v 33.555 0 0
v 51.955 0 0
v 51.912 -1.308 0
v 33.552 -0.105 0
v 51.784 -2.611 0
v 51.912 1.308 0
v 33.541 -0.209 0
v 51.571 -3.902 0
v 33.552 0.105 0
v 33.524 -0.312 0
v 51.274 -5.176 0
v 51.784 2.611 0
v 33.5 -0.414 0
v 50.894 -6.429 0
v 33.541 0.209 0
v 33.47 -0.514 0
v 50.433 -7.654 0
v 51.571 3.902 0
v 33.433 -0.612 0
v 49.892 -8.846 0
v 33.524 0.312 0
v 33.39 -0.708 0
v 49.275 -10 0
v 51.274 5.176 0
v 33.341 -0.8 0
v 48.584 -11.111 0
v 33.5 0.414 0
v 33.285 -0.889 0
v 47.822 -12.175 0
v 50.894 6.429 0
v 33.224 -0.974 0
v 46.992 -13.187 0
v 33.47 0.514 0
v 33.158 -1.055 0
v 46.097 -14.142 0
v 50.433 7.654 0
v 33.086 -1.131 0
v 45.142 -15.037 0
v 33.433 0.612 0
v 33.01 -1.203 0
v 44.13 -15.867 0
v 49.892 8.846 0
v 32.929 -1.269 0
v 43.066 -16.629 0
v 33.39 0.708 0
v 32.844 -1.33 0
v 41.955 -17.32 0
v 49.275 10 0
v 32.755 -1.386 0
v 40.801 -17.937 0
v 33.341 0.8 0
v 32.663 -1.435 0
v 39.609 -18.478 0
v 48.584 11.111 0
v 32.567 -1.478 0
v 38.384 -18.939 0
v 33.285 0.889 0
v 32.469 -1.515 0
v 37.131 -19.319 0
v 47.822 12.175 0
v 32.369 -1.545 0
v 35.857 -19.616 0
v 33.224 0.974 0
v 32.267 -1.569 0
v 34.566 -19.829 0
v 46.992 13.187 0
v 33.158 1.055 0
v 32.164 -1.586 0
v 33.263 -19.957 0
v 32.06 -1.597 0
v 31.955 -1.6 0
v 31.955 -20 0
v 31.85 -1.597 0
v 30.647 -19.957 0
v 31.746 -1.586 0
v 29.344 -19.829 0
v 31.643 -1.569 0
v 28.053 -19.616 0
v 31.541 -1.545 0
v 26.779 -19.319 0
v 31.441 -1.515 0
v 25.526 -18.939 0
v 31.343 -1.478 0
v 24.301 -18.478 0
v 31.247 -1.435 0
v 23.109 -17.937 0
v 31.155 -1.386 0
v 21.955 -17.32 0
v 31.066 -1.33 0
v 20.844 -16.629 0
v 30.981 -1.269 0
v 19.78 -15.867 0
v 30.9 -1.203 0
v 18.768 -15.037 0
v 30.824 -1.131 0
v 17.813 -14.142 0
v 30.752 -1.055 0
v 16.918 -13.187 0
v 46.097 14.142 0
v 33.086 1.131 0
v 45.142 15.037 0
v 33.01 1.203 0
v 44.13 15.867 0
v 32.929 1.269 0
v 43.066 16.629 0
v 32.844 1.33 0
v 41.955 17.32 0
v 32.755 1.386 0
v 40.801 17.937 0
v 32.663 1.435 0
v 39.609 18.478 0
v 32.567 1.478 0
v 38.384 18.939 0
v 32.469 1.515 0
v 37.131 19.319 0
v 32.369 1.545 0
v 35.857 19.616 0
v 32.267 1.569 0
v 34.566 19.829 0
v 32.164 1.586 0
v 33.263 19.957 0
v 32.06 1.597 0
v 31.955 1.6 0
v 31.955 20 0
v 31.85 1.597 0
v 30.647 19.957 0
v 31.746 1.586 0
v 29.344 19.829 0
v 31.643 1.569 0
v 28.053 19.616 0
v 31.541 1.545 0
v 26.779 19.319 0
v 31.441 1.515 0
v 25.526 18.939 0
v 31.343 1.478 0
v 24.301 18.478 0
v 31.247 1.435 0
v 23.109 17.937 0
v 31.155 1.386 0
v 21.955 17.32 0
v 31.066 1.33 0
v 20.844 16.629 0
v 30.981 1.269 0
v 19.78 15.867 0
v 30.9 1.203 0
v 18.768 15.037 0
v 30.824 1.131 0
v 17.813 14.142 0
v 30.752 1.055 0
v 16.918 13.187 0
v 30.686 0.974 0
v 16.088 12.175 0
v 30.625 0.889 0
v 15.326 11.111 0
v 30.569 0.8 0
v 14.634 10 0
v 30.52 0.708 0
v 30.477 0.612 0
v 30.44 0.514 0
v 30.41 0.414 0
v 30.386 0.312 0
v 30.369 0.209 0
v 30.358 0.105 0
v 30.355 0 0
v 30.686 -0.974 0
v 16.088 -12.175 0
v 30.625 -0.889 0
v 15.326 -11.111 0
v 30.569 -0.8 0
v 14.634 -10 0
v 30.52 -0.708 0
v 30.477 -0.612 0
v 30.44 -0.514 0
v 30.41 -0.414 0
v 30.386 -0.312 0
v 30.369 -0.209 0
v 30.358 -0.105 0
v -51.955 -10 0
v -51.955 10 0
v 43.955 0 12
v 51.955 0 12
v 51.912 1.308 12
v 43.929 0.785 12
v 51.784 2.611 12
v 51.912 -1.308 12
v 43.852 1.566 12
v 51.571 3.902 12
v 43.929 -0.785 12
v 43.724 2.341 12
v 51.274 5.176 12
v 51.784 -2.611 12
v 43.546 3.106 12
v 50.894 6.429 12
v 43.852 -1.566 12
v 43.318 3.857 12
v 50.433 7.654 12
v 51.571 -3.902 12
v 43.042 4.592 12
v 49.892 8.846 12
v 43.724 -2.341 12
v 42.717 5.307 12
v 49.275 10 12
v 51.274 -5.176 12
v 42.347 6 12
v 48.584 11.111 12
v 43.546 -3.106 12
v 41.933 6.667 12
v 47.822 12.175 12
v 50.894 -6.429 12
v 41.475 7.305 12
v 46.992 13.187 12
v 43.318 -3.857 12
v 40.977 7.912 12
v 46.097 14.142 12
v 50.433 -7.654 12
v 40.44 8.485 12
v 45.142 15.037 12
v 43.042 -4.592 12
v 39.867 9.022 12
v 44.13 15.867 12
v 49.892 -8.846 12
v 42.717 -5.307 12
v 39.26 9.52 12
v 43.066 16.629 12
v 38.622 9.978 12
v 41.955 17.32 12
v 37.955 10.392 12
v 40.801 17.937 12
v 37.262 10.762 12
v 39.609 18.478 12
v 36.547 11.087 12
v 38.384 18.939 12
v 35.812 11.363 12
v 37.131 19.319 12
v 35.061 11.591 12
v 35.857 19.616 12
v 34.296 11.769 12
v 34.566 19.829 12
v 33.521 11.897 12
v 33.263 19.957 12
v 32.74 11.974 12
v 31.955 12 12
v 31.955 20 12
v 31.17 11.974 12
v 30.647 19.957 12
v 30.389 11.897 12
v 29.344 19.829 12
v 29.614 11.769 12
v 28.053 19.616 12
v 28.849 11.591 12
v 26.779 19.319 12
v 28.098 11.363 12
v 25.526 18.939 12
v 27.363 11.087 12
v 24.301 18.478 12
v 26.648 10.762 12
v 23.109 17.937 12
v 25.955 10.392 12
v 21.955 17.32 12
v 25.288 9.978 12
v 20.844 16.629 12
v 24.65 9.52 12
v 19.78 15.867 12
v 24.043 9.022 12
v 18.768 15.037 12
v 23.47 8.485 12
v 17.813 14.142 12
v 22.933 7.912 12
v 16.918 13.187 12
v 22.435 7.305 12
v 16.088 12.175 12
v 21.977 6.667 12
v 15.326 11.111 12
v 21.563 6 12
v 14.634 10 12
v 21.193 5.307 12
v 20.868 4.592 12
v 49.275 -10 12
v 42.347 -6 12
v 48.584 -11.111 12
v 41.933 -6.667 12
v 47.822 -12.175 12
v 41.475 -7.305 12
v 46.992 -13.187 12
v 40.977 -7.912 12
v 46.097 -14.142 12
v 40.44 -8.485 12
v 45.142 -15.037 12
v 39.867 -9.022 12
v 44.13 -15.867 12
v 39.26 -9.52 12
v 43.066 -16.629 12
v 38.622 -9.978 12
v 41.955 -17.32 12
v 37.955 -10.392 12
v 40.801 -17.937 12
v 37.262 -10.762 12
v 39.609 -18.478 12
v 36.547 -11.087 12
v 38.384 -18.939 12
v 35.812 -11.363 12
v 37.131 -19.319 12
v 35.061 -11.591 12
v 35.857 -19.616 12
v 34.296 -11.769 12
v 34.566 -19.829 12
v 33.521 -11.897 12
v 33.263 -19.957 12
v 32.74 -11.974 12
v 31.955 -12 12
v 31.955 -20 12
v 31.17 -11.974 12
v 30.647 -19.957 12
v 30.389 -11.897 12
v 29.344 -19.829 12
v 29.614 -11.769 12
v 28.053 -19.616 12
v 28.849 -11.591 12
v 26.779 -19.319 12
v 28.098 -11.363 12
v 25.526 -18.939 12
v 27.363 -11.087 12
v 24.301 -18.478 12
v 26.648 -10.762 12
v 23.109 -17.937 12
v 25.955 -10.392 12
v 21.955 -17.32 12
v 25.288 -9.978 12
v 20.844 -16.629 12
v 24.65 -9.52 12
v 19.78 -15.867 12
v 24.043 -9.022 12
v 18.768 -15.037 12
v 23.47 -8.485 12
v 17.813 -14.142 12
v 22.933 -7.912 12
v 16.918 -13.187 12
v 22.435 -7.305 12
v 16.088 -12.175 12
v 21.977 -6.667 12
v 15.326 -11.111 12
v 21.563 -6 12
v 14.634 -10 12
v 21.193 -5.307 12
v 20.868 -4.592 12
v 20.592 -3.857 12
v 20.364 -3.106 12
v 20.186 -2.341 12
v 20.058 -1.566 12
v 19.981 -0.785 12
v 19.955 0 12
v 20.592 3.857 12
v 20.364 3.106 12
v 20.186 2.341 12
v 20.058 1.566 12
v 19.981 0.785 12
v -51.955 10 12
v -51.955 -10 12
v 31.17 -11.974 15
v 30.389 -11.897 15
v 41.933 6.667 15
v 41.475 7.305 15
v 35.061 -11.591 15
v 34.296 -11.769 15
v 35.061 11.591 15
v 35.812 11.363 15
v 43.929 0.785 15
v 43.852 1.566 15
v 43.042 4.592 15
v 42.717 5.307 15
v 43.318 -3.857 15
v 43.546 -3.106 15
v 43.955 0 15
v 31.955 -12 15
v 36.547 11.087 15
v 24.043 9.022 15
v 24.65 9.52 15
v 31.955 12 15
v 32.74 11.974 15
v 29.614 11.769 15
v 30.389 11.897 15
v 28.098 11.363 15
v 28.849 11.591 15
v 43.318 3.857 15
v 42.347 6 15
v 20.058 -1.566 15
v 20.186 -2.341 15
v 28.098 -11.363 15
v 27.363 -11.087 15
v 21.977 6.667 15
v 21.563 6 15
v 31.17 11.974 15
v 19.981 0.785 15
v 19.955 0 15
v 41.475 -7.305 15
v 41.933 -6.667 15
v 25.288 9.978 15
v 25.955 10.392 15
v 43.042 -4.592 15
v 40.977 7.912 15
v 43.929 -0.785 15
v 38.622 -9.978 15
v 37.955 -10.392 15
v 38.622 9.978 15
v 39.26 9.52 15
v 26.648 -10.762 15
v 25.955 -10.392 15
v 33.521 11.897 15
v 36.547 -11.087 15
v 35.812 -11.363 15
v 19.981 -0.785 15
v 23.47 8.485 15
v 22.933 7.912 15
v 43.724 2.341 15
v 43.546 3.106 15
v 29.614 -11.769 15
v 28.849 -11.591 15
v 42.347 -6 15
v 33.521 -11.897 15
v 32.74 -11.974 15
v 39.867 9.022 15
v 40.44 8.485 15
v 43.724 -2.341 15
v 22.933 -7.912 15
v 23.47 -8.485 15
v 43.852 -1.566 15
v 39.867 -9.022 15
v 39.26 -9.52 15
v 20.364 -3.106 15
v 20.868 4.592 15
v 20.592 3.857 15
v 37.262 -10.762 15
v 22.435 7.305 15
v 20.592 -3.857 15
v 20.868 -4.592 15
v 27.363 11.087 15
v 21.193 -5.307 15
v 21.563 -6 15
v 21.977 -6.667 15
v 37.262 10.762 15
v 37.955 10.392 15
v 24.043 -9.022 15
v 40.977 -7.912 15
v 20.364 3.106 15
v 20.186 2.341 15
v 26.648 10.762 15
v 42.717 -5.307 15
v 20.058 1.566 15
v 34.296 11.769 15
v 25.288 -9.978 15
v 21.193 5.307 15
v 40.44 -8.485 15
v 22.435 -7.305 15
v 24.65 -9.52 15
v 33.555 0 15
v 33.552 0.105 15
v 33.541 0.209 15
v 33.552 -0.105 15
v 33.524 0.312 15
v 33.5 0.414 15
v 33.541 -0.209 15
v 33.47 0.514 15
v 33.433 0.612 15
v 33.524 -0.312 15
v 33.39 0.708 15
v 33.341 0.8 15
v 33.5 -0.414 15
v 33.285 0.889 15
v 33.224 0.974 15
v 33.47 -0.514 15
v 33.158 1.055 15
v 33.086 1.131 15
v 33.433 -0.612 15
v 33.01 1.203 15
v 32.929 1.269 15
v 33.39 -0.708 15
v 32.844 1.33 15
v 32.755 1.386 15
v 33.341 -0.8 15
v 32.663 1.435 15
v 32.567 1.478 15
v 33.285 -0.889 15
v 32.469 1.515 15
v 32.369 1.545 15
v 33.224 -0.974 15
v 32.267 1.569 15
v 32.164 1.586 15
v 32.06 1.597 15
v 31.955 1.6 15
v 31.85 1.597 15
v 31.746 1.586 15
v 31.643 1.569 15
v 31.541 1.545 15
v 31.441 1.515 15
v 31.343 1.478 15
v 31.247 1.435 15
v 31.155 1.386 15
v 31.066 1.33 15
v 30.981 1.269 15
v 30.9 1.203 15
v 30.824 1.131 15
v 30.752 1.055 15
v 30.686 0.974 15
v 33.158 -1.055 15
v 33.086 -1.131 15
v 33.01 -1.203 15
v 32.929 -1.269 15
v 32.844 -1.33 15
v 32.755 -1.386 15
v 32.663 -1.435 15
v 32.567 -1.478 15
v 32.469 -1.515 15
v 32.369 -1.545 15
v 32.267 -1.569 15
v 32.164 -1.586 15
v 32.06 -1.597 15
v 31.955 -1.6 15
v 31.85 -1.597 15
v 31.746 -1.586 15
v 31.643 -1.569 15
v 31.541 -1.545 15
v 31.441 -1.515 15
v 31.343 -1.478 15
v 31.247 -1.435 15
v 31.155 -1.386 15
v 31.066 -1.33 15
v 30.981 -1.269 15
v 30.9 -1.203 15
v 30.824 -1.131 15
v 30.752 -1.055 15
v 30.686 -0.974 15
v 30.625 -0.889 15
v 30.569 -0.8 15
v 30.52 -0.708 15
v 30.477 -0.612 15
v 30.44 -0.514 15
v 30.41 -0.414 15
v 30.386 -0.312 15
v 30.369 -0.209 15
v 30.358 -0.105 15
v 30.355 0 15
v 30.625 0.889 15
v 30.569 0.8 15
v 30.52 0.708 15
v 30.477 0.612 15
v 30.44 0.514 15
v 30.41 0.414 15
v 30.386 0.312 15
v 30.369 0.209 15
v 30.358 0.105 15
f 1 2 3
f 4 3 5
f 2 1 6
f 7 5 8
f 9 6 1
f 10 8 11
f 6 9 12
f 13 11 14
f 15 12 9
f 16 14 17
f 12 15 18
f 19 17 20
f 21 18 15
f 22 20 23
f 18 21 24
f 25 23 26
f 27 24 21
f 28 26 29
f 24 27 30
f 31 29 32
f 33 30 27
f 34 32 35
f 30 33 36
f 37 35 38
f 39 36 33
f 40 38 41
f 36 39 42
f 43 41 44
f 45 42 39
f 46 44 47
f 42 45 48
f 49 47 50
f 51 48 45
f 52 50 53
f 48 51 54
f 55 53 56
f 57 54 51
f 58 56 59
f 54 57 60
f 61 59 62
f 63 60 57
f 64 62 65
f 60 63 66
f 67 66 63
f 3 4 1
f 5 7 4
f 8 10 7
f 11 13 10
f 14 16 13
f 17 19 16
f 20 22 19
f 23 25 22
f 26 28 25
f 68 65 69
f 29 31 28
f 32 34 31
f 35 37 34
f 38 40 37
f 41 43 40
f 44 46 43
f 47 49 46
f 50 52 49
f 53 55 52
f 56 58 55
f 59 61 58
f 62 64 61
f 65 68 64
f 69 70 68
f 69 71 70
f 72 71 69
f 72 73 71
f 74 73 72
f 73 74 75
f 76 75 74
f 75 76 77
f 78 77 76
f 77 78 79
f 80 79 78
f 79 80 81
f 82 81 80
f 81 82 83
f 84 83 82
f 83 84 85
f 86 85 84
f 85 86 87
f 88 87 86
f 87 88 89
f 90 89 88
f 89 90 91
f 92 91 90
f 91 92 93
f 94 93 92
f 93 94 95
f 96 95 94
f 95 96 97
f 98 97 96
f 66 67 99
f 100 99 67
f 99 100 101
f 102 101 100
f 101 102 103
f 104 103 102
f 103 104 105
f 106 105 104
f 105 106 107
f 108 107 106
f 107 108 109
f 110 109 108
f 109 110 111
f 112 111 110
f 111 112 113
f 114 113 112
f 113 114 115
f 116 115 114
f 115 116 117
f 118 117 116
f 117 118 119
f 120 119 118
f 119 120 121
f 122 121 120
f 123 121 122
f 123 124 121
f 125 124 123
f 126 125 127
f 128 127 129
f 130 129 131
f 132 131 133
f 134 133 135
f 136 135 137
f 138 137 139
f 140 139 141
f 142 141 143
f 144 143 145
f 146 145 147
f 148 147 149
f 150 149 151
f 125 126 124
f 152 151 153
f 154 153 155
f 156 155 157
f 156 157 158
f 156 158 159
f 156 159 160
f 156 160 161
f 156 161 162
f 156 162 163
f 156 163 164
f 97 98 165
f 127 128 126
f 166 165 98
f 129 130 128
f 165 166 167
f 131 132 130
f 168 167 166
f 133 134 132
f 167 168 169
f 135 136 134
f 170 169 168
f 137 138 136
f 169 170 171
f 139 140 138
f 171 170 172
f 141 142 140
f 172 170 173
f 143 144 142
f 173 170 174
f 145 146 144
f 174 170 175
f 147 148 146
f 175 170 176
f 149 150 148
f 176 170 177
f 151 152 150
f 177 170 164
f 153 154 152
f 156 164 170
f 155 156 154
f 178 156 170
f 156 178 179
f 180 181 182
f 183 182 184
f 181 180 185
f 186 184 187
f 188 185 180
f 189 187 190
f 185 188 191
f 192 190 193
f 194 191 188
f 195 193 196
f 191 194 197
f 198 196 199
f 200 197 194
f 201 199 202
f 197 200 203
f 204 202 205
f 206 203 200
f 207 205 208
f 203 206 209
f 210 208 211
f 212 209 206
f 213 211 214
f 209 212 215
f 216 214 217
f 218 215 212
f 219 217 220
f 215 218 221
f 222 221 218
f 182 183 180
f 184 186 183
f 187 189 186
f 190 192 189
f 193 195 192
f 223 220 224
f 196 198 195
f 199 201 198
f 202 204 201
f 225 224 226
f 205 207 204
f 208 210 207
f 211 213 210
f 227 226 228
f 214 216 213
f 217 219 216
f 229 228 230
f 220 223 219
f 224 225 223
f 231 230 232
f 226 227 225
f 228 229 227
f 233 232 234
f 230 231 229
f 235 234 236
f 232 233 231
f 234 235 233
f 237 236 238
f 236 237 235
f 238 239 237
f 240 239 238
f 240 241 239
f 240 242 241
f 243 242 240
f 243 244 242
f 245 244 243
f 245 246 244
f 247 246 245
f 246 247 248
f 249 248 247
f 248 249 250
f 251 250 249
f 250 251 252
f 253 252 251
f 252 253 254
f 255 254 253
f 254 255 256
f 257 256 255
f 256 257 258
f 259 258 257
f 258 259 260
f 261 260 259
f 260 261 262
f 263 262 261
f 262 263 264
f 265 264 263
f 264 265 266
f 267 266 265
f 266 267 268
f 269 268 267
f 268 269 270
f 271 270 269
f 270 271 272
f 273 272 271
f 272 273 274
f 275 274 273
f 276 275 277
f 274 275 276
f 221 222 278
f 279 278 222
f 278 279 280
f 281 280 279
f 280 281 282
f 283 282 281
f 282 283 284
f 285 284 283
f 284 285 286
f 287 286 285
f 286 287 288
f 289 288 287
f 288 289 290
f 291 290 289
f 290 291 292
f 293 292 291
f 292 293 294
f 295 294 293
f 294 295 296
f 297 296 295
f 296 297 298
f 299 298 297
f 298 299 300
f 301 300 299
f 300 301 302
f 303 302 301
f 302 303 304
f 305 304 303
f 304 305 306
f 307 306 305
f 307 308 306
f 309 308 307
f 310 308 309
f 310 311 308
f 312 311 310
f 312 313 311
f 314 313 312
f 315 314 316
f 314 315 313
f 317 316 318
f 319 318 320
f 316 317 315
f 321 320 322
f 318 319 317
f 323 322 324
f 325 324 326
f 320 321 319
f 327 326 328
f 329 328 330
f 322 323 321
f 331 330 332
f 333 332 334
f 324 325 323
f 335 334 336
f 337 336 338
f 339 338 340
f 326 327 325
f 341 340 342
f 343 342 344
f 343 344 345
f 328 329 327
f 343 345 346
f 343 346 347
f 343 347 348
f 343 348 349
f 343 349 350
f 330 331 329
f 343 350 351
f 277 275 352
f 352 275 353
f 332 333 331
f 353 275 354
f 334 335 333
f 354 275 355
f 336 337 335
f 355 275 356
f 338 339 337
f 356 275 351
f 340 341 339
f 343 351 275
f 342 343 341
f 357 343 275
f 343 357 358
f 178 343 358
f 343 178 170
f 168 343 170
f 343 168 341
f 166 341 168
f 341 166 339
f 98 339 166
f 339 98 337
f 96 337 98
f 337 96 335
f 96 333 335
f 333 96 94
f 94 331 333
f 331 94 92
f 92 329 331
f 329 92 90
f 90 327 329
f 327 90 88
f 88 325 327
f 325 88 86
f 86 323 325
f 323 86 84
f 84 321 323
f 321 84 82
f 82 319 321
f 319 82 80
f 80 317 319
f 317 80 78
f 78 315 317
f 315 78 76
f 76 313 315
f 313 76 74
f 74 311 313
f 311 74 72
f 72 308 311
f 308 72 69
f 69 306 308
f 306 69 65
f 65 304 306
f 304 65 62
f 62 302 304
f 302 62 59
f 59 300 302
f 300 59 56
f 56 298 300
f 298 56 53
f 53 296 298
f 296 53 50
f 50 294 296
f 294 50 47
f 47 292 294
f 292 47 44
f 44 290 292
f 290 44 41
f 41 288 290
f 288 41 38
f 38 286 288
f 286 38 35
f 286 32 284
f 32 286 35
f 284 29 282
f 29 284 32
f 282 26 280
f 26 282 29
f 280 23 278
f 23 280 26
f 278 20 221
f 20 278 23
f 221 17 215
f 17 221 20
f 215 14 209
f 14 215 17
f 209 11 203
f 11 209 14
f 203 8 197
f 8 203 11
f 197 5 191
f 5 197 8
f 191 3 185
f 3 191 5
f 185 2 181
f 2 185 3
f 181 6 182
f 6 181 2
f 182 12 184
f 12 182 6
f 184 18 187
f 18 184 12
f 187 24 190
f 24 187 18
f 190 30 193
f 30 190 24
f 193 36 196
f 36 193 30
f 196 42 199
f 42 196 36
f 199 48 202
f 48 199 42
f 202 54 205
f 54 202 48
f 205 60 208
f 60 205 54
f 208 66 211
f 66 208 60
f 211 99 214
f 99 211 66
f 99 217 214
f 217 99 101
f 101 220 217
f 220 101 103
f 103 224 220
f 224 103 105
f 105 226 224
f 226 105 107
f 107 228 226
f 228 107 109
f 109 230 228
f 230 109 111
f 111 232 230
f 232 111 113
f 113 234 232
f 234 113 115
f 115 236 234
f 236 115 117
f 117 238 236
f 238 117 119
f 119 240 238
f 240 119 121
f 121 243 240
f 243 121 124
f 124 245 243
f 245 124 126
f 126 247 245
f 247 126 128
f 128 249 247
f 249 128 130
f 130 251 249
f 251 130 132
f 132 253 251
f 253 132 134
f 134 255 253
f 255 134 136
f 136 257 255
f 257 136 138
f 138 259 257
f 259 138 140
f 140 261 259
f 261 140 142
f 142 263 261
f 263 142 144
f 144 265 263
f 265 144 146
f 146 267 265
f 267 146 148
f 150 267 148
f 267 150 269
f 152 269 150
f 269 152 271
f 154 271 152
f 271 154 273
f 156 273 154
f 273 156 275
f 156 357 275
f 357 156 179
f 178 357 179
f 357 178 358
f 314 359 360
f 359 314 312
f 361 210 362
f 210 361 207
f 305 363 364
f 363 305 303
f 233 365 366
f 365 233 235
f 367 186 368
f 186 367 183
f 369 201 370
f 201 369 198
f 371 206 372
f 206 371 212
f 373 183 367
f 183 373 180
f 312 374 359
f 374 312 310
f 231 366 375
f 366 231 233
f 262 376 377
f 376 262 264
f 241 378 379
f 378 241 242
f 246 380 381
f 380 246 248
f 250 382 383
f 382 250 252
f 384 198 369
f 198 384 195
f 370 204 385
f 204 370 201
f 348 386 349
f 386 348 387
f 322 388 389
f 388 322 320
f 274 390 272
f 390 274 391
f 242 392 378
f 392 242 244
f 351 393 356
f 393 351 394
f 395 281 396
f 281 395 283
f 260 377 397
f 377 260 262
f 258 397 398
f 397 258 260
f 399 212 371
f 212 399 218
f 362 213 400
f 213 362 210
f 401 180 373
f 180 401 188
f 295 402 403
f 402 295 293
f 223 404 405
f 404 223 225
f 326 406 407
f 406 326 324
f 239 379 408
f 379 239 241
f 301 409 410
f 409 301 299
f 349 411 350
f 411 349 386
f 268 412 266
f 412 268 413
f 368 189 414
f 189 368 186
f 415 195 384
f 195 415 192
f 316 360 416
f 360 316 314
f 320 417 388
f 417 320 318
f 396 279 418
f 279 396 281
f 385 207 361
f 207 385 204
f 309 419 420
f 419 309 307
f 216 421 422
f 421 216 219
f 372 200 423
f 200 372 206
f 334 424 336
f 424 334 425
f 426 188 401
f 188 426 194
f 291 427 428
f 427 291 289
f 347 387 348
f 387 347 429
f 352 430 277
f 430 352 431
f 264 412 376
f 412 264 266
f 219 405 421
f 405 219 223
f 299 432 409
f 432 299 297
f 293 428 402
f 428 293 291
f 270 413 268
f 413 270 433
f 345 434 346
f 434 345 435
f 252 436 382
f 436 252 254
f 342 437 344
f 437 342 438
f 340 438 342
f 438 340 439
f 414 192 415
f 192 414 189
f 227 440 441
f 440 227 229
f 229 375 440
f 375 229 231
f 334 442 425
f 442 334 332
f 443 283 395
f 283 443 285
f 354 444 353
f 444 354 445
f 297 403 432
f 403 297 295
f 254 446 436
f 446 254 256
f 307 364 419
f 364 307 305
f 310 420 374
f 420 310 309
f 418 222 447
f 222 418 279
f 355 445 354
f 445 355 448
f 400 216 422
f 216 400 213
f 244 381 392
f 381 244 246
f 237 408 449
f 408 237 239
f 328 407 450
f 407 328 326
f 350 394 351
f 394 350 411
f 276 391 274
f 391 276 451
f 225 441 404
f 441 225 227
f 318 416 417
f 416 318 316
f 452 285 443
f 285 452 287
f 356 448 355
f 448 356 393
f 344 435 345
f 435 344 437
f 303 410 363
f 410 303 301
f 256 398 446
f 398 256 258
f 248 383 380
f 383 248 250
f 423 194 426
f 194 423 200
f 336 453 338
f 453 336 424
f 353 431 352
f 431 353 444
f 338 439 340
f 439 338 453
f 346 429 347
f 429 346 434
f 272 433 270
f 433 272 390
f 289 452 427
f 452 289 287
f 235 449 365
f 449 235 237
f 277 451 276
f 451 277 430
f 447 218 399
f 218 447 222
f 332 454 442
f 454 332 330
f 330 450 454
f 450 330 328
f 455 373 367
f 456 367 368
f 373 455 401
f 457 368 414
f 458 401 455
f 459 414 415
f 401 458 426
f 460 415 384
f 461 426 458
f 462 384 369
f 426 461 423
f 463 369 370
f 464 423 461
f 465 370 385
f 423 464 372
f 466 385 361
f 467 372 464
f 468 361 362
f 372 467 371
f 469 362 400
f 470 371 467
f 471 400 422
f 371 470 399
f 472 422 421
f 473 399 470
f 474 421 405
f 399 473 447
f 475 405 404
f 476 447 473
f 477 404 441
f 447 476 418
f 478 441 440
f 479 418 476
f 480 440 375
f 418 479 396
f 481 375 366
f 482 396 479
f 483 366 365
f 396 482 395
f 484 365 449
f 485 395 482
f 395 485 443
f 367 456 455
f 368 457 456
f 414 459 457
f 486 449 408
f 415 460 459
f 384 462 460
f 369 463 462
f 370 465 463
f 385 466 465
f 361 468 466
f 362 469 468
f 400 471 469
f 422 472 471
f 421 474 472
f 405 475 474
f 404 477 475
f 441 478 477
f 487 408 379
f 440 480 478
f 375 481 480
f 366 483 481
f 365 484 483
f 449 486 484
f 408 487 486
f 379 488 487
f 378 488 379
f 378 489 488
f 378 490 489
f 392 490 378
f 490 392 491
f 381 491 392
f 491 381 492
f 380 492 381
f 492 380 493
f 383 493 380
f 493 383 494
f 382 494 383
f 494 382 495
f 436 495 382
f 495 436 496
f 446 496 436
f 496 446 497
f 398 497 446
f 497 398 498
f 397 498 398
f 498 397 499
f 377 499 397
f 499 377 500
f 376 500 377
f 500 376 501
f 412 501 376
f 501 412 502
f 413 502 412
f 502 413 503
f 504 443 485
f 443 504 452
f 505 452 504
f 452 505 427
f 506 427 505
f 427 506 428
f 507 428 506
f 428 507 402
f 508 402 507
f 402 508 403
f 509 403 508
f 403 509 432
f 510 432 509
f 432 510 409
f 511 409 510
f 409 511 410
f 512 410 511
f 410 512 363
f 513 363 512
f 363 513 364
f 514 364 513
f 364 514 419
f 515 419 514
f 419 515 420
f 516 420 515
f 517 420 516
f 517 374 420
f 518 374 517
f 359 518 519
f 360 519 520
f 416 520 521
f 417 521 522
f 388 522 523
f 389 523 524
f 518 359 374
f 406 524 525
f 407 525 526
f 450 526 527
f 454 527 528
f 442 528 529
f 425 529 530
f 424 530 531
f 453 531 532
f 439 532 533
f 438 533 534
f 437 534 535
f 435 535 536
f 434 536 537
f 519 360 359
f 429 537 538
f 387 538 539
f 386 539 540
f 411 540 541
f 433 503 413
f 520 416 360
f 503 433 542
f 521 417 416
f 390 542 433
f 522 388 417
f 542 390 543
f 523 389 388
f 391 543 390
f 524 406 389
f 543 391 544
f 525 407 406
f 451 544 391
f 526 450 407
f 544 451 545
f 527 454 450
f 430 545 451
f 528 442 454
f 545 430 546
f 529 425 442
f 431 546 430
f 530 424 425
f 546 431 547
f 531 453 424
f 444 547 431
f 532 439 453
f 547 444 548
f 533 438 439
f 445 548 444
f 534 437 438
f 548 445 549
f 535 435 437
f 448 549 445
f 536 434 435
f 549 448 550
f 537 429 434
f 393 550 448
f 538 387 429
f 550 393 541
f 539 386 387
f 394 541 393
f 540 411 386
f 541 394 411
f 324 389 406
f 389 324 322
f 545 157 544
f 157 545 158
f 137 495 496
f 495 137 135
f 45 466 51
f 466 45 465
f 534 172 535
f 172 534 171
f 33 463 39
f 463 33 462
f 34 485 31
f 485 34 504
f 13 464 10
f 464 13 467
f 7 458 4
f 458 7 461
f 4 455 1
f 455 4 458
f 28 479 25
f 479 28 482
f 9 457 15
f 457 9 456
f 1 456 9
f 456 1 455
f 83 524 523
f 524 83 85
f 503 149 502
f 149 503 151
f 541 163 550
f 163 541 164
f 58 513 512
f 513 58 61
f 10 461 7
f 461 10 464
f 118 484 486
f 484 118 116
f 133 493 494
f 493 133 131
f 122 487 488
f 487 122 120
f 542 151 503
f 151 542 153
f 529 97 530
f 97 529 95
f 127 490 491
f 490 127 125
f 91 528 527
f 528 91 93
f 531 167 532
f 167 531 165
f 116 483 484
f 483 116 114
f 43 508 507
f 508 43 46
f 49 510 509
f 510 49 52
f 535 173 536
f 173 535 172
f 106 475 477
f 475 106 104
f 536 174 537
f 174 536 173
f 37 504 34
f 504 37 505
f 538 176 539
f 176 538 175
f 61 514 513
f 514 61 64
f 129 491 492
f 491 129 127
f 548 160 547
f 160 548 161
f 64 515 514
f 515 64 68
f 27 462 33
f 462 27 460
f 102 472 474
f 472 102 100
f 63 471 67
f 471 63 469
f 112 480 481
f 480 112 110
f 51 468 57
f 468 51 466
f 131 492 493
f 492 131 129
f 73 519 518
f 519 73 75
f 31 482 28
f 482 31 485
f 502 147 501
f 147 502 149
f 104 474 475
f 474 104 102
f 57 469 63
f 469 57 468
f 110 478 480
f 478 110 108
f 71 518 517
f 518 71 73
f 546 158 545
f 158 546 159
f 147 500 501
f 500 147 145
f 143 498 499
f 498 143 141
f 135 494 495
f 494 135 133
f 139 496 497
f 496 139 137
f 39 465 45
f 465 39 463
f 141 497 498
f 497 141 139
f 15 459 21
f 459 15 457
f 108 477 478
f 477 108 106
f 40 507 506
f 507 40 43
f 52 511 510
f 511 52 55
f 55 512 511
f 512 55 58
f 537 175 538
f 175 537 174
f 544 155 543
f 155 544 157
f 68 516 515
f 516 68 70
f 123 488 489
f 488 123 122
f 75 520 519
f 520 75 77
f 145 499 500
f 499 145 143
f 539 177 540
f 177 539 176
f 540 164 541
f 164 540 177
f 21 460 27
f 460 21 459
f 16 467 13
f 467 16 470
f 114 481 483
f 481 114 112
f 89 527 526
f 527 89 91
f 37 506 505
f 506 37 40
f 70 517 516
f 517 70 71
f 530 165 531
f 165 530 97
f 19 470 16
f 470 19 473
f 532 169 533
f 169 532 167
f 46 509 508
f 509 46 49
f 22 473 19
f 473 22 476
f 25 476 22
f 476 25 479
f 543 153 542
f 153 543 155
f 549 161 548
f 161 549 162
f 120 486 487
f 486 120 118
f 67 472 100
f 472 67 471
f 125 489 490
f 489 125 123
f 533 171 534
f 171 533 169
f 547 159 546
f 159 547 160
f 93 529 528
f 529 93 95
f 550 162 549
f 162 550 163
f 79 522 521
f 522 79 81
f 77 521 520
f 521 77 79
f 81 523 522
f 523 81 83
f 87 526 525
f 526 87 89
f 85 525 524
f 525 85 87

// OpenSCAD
// Parametric arm for the hotbed foot/camera mount.
// Self-contained OpenSCAD model; does not import or reference STL files.

/* [Arm body] */
// Overall arm length from the square end to the far side of the round end.
arm_length = 103.91; // [30:0.1:180]
// Straight arm width.
arm_width = 20.00; // [6:0.1:60]
// Arm thickness/height. Default matches the hotbed foot height.
arm_height = 12.00; // [2:0.1:30]

/* [Round end] */
// Diameter of the round section at the end of the arm.
end_circle_diameter = 40.00; // [10:0.1:80]
// Segment count for the round end and screw hole.
round_detail = 96; // [32, 48, 64, 96, 128]

/* [Raised / lowered circle pad] */
// Raised adds material above the round end; Lowered cuts a circular recess; Flush disables the feature.
pad_style = "Raised"; // [Raised, Lowered, Flush]
// Diameter of the raised/lowered circular pad area.
pad_diameter = 24.00; // [6:0.1:70]
// Height of raised pad or depth of lowered recess.
pad_height = 3.00; // [0.2:0.1:12]

/* [M3 screw hole] */
// M3 clearance hole diameter.
m3_hole_diameter = 3.20; // [2.8:0.05:4.0]
// Optional counterbore diameter. Set style to None to disable.
counterbore_style = "None"; // [None, Raised side, Lowered side]
// Counterbore diameter for screw head clearance.
counterbore_diameter = 6.20; // [4:0.1:12]
// Counterbore depth.
counterbore_depth = 2.50; // [0.5:0.1:8]

/* [Placement] */
// Centered places the arm around the origin; Positive X starts the square end at X=0.
model_position = "Centered"; // [Centered, Positive X]

module rounded_arm_2d(length, width, end_diameter) {
  circle_center_x = length / 2 - end_diameter / 2;

  union() {
    translate([-length / 2, -width / 2])
      square([max(circle_center_x + length / 2, 0.01), width]);

    translate([circle_center_x, 0])
      circle(d = end_diameter, $fn = round_detail);
  }
}

module arm_base(length, width, height, end_diameter) {
  linear_extrude(height = height)
    rounded_arm_2d(length, width, end_diameter);
}

module circle_pad(length, height, end_diameter, diameter, style, feature_height) {
  circle_center_x = length / 2 - end_diameter / 2;

  if (style == "Raised") {
    translate([circle_center_x, 0, height])
      cylinder(h = feature_height, d = diameter, $fn = round_detail);
  }
}

module pad_recess_cut(length, height, end_diameter, diameter, style, feature_height) {
  circle_center_x = length / 2 - end_diameter / 2;

  if (style == "Lowered") {
    translate([circle_center_x, 0, height - feature_height])
      cylinder(h = feature_height + 0.02, d = diameter, $fn = round_detail);
  }
}

module screw_cuts(length, height, end_diameter) {
  circle_center_x = length / 2 - end_diameter / 2;
  total_cut_height = height + (pad_style == "Raised" ? pad_height : 0) + 0.04;

  translate([circle_center_x, 0, -0.02])
    cylinder(h = total_cut_height, d = m3_hole_diameter, $fn = round_detail);

  if (counterbore_style == "Raised side") {
    translate([circle_center_x, 0, height + (pad_style == "Raised" ? pad_height : 0) - counterbore_depth])
      cylinder(h = counterbore_depth + 0.04, d = counterbore_diameter, $fn = round_detail);
  }

  if (counterbore_style == "Lowered side") {
    translate([circle_center_x, 0, -0.02])
      cylinder(h = counterbore_depth + 0.04, d = counterbore_diameter, $fn = round_detail);
  }
}

module hotbed_foot_arm_v1(
  length = arm_length,
  width = arm_width,
  height = arm_height,
  end_diameter = end_circle_diameter,
  position = model_position
) {
  placement = position == "Positive X" ? [length / 2, 0, 0] : [0, 0, 0];

  translate(placement)
    difference() {
      union() {
        arm_base(length, width, height, end_diameter);
        circle_pad(length, height, end_diameter, pad_diameter, pad_style, pad_height);
      }

      pad_recess_cut(length, height, end_diameter, pad_diameter, pad_style, pad_height);
      screw_cuts(length, height, end_diameter);
    }
}

hotbed_foot_arm_v1();
